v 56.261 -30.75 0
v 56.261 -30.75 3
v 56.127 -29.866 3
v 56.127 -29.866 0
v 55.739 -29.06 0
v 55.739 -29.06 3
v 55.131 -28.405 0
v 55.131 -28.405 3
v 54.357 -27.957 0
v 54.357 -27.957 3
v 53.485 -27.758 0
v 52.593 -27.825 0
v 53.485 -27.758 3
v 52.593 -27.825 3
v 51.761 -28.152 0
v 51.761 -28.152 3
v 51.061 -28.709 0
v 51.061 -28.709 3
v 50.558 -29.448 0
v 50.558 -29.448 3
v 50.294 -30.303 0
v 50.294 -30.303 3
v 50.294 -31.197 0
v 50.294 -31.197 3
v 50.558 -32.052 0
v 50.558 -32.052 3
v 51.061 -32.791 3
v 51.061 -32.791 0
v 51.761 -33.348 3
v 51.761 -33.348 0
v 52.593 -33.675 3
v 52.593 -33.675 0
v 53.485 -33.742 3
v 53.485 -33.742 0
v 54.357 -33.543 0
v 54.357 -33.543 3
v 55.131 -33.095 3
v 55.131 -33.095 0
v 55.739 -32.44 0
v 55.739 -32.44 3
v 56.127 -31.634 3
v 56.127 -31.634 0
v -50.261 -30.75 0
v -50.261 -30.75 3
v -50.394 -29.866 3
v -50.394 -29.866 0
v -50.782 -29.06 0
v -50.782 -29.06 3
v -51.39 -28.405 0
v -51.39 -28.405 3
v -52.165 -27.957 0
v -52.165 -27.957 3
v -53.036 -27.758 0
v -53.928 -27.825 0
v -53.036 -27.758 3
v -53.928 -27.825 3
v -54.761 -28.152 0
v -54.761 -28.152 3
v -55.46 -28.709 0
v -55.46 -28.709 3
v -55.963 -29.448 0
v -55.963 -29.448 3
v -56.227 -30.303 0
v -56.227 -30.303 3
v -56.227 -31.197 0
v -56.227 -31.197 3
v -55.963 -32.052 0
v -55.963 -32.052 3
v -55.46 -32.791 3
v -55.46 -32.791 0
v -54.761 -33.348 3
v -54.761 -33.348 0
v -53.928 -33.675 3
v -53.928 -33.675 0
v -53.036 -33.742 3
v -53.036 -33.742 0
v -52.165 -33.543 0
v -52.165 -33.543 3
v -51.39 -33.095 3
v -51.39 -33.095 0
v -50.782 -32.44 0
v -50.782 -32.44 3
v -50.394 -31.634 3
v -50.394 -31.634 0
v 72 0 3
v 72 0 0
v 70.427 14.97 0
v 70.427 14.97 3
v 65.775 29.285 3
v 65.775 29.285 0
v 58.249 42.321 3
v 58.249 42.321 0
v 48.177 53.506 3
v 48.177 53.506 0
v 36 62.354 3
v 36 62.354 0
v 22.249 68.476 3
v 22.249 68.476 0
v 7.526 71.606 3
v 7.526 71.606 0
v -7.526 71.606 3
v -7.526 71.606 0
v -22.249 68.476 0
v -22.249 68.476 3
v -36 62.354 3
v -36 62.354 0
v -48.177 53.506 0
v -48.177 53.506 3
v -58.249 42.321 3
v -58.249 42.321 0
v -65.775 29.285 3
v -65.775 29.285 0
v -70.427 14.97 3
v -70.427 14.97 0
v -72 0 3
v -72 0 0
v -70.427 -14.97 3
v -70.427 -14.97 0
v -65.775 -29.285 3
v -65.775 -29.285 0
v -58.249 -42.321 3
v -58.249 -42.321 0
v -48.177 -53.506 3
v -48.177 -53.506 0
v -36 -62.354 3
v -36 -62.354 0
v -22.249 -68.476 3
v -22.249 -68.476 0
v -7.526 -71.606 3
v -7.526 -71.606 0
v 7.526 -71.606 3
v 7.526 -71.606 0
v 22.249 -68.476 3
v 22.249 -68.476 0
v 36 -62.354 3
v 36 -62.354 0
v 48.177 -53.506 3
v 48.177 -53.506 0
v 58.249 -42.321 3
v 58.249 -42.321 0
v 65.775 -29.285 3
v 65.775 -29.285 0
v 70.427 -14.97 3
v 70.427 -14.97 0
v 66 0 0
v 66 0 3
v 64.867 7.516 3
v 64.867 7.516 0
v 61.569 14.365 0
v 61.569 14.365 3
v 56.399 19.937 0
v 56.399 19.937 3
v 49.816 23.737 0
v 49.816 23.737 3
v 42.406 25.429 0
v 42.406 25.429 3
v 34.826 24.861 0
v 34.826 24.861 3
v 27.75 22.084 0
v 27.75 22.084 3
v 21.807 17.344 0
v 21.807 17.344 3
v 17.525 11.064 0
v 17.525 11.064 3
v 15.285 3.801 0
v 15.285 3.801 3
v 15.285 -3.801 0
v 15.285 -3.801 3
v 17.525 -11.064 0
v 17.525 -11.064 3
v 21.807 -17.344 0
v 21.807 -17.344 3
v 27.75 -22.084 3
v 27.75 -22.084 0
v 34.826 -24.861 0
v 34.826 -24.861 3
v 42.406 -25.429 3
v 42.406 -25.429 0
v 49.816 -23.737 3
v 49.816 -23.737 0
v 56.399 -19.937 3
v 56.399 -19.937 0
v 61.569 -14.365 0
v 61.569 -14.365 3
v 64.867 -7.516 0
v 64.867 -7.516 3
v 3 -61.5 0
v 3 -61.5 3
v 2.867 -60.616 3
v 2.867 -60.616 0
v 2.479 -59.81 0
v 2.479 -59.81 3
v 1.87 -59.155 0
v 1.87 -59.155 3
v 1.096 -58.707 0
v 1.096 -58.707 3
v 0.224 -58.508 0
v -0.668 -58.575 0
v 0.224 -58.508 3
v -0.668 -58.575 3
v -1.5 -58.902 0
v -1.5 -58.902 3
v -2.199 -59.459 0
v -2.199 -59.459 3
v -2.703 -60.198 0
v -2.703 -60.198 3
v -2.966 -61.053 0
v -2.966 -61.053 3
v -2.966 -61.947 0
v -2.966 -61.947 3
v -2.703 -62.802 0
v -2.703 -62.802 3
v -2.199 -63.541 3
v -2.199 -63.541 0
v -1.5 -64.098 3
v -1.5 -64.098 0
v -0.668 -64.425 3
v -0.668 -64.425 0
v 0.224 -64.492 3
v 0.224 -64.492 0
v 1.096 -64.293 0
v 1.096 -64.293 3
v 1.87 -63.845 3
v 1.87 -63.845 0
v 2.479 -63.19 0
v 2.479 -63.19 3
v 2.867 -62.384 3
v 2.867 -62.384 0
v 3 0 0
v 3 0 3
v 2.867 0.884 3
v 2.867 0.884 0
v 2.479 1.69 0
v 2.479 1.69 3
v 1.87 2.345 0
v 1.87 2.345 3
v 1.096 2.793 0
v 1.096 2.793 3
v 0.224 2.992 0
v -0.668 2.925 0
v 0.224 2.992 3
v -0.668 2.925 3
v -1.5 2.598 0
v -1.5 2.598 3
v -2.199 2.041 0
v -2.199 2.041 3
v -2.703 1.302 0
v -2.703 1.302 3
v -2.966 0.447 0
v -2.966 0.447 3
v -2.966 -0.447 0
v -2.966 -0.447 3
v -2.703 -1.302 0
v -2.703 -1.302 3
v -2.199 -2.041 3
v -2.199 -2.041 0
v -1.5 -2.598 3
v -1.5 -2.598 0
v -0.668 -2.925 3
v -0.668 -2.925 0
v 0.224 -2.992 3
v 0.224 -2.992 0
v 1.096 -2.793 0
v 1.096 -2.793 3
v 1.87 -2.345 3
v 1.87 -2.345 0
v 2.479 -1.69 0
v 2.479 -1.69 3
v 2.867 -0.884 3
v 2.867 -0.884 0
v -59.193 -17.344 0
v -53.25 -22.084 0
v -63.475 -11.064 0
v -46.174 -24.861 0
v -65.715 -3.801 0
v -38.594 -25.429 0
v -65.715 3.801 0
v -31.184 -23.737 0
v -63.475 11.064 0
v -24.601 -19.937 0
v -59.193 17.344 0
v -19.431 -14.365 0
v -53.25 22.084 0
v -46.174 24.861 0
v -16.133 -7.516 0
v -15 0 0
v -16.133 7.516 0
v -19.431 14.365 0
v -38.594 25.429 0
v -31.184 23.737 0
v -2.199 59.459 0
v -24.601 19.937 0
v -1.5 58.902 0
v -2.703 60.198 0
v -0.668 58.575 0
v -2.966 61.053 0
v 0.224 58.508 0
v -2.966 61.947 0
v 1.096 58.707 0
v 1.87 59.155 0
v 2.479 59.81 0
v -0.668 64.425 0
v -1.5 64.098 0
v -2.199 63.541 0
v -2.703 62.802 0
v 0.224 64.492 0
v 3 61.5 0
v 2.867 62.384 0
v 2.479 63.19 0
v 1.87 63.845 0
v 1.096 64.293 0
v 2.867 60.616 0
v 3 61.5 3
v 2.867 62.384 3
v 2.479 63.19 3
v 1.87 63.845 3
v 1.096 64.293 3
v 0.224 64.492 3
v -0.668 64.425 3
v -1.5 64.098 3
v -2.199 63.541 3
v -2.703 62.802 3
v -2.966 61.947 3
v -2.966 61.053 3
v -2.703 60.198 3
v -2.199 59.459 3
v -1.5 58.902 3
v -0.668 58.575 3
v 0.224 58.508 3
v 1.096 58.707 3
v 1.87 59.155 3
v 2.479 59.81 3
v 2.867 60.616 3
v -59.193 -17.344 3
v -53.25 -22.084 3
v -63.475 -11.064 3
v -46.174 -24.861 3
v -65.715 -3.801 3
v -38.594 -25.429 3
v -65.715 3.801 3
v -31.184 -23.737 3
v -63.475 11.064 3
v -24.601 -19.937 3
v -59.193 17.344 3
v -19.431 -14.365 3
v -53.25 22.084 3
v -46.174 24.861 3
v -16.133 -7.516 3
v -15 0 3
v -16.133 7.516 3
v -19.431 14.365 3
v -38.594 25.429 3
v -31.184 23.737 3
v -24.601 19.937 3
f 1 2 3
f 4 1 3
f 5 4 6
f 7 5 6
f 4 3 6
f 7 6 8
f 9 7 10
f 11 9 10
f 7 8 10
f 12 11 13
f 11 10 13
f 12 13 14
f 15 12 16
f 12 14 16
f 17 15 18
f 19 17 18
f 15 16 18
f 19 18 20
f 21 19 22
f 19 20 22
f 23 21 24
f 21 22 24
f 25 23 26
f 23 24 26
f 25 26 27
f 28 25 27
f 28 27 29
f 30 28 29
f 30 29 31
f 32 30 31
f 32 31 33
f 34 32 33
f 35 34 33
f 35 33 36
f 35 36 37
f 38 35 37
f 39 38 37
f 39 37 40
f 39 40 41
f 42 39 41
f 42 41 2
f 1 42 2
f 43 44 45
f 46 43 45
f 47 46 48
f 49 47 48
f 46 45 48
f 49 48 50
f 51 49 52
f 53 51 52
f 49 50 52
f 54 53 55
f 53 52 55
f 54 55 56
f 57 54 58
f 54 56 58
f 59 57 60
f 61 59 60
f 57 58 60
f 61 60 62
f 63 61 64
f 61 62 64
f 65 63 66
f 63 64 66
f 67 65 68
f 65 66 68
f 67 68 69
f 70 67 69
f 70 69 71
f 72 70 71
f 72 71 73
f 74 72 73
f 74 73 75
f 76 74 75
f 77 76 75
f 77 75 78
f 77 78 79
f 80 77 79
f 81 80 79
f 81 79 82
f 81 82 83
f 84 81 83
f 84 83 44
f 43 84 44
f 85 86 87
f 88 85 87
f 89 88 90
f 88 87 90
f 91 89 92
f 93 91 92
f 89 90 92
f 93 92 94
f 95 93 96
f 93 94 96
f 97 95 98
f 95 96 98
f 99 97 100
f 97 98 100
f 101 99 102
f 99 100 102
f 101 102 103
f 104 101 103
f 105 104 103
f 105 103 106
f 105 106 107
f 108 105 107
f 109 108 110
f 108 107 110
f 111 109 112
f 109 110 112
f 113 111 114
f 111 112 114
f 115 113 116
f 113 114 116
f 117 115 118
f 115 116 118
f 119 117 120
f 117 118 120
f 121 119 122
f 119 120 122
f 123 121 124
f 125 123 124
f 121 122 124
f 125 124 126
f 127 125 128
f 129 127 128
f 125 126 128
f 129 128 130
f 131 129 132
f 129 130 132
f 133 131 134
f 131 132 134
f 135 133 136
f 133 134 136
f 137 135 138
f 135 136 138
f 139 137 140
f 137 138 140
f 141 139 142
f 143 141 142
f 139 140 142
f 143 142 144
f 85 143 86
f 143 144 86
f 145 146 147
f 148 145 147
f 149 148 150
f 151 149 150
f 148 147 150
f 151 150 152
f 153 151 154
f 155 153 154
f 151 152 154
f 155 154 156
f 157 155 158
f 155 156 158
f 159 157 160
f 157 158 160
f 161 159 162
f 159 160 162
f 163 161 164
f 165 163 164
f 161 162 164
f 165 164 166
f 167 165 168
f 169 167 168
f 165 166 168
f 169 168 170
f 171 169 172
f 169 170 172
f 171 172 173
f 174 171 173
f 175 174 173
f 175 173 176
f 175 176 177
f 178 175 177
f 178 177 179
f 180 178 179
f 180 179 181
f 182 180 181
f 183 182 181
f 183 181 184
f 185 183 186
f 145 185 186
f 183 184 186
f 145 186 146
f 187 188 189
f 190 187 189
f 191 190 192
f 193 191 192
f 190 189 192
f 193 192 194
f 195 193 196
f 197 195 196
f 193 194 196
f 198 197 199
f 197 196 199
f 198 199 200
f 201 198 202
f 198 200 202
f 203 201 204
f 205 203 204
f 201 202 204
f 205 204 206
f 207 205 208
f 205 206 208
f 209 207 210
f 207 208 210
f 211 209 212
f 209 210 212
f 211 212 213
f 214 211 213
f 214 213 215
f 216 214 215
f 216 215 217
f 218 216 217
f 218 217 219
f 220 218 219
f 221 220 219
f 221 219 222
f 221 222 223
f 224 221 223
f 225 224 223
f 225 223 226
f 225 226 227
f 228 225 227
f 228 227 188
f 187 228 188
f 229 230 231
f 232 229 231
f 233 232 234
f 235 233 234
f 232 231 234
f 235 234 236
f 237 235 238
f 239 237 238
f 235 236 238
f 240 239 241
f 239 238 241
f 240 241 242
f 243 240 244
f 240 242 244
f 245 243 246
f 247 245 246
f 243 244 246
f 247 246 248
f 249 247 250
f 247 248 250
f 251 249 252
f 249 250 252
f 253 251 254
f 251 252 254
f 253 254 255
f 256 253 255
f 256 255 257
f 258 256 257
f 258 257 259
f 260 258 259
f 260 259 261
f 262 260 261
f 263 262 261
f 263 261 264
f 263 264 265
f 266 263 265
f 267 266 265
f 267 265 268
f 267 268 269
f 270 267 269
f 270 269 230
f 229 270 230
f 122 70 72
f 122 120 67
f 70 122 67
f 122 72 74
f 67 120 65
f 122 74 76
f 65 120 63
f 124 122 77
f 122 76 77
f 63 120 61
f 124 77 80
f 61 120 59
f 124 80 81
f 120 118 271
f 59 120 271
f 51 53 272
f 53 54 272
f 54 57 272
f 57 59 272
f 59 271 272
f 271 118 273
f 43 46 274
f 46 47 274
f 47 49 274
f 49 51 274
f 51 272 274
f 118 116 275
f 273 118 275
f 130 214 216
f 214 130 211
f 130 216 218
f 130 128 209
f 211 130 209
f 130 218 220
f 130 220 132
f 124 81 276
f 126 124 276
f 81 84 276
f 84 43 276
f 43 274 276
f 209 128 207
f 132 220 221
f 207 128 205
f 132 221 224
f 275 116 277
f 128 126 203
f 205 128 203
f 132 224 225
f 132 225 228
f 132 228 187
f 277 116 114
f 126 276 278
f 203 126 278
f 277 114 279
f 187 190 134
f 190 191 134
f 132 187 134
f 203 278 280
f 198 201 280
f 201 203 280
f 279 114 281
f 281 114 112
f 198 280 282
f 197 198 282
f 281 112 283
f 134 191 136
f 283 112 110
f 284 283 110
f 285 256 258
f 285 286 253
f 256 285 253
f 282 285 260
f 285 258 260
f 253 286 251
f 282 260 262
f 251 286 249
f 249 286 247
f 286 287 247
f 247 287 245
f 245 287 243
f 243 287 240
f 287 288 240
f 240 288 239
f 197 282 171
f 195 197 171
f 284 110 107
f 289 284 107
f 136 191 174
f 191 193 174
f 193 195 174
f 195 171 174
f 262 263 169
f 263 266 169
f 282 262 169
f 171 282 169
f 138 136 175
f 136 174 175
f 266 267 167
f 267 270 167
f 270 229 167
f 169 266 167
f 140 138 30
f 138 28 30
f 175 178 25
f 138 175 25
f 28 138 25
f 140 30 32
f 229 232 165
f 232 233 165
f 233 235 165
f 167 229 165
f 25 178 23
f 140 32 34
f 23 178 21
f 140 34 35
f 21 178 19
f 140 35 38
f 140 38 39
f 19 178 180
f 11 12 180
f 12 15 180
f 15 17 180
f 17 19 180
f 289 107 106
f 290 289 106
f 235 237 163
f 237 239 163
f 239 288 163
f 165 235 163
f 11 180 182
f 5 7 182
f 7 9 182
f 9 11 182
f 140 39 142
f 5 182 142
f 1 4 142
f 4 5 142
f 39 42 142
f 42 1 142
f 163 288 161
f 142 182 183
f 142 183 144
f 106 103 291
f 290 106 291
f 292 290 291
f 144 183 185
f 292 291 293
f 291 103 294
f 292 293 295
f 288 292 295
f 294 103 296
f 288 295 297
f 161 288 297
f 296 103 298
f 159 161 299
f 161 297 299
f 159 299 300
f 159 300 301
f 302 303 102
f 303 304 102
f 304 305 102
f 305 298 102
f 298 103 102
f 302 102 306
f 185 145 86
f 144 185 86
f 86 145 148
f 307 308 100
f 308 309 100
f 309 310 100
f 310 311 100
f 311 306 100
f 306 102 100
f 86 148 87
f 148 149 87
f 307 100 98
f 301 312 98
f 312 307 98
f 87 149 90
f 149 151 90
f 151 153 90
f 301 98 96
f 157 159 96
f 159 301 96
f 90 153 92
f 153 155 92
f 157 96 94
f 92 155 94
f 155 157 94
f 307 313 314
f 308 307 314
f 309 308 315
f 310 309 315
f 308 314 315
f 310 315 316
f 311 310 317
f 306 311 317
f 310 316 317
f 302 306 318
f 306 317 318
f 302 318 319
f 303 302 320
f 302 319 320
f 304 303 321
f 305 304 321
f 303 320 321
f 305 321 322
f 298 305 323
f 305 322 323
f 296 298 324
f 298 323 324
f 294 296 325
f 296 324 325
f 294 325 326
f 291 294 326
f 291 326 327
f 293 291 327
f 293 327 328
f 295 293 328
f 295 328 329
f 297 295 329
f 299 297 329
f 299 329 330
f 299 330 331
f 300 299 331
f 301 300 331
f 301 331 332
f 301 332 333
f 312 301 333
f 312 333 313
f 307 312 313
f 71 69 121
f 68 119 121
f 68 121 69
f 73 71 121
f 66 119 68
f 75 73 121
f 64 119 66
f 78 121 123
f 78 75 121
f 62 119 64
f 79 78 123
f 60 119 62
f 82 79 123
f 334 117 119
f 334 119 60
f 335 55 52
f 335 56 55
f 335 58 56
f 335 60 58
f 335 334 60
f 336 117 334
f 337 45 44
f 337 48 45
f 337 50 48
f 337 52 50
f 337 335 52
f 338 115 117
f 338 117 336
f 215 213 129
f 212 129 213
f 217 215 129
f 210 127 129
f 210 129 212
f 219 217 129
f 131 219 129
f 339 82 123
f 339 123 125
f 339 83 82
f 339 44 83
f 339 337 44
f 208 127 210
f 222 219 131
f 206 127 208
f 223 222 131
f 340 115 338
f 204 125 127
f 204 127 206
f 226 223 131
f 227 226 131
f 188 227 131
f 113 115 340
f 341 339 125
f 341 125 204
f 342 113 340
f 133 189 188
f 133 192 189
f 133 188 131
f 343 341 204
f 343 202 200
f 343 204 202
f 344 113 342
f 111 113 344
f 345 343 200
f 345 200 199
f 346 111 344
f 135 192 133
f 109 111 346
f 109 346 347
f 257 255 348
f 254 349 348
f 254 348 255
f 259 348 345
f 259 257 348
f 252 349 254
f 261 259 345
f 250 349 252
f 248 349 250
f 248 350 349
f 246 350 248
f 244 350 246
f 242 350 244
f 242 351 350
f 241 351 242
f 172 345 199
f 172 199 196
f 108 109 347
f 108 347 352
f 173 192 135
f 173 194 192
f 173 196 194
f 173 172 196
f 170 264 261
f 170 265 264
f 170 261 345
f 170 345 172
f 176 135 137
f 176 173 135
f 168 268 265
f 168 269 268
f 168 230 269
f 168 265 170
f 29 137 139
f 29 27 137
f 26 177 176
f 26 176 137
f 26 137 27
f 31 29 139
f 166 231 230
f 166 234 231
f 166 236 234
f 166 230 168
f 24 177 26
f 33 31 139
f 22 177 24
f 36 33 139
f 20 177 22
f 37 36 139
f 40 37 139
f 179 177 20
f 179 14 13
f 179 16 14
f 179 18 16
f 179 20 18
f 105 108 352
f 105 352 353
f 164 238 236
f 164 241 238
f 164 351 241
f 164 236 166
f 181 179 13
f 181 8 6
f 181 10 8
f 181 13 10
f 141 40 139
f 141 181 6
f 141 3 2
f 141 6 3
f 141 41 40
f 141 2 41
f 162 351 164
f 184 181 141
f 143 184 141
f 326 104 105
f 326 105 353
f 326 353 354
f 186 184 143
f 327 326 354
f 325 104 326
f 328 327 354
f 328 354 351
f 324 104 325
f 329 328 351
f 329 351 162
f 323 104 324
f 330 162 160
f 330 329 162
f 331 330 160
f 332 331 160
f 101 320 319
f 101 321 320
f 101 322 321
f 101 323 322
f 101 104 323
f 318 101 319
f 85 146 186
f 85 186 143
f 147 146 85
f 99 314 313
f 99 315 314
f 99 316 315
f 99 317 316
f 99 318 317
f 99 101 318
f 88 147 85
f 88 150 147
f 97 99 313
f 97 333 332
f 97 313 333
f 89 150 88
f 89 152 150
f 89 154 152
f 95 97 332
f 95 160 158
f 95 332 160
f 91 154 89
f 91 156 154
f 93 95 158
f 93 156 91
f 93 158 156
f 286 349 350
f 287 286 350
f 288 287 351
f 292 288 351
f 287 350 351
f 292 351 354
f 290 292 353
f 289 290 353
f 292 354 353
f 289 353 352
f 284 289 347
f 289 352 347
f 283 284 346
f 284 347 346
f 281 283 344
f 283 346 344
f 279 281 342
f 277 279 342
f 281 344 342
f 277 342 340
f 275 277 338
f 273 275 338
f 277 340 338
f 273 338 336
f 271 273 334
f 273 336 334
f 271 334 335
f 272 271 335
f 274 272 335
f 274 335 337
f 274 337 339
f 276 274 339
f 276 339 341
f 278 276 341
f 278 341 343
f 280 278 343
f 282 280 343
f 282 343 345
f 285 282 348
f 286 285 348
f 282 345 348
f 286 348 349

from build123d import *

# Parameters (mm, degrees)
F0_R     = 72
F1_DEPTH = 3
F2_R     = 25.5
F3_DEPTH = 3
F4_R     = 3
F5_DEPTH = 25.4
F6_R     = 3
F7_DEPTH = 25.4


with BuildPart() as f1:
    # F0 (on Top) → F1 (new body)
    with BuildSketch(Plane.XY):
        Circle(F0_R)
    extrude(amount=F1_DEPTH)

    # F2 (on face) → F3 (cut)
    with BuildSketch(Plane.XY.offset(3)):
        with Locations((-40.5, 0)):
            Circle(F2_R)
        with Locations((40.5, 0)):
            Circle(F2_R)
    extrude(amount=-F3_DEPTH, mode=Mode.SUBTRACT)

    # F4 (on face) → F5 (cut)
    with BuildSketch(Plane.XY.offset(3)):
        with Locations((0, 61.5)):
            Circle(F4_R)
        Circle(F4_R)
        with Locations((0, -61.5)):
            Circle(F4_R)
    extrude(amount=-F5_DEPTH, mode=Mode.SUBTRACT)

    # F6 (on face) → F7 (cut)
    with BuildSketch(Plane.XY.offset(3)):
        with Locations((-53.260562, -30.75)):
            Circle(F6_R)
        with Locations((53.260562, -30.75)):
            Circle(F6_R)
    extrude(amount=-F7_DEPTH, mode=Mode.SUBTRACT)


solid = f1.part
